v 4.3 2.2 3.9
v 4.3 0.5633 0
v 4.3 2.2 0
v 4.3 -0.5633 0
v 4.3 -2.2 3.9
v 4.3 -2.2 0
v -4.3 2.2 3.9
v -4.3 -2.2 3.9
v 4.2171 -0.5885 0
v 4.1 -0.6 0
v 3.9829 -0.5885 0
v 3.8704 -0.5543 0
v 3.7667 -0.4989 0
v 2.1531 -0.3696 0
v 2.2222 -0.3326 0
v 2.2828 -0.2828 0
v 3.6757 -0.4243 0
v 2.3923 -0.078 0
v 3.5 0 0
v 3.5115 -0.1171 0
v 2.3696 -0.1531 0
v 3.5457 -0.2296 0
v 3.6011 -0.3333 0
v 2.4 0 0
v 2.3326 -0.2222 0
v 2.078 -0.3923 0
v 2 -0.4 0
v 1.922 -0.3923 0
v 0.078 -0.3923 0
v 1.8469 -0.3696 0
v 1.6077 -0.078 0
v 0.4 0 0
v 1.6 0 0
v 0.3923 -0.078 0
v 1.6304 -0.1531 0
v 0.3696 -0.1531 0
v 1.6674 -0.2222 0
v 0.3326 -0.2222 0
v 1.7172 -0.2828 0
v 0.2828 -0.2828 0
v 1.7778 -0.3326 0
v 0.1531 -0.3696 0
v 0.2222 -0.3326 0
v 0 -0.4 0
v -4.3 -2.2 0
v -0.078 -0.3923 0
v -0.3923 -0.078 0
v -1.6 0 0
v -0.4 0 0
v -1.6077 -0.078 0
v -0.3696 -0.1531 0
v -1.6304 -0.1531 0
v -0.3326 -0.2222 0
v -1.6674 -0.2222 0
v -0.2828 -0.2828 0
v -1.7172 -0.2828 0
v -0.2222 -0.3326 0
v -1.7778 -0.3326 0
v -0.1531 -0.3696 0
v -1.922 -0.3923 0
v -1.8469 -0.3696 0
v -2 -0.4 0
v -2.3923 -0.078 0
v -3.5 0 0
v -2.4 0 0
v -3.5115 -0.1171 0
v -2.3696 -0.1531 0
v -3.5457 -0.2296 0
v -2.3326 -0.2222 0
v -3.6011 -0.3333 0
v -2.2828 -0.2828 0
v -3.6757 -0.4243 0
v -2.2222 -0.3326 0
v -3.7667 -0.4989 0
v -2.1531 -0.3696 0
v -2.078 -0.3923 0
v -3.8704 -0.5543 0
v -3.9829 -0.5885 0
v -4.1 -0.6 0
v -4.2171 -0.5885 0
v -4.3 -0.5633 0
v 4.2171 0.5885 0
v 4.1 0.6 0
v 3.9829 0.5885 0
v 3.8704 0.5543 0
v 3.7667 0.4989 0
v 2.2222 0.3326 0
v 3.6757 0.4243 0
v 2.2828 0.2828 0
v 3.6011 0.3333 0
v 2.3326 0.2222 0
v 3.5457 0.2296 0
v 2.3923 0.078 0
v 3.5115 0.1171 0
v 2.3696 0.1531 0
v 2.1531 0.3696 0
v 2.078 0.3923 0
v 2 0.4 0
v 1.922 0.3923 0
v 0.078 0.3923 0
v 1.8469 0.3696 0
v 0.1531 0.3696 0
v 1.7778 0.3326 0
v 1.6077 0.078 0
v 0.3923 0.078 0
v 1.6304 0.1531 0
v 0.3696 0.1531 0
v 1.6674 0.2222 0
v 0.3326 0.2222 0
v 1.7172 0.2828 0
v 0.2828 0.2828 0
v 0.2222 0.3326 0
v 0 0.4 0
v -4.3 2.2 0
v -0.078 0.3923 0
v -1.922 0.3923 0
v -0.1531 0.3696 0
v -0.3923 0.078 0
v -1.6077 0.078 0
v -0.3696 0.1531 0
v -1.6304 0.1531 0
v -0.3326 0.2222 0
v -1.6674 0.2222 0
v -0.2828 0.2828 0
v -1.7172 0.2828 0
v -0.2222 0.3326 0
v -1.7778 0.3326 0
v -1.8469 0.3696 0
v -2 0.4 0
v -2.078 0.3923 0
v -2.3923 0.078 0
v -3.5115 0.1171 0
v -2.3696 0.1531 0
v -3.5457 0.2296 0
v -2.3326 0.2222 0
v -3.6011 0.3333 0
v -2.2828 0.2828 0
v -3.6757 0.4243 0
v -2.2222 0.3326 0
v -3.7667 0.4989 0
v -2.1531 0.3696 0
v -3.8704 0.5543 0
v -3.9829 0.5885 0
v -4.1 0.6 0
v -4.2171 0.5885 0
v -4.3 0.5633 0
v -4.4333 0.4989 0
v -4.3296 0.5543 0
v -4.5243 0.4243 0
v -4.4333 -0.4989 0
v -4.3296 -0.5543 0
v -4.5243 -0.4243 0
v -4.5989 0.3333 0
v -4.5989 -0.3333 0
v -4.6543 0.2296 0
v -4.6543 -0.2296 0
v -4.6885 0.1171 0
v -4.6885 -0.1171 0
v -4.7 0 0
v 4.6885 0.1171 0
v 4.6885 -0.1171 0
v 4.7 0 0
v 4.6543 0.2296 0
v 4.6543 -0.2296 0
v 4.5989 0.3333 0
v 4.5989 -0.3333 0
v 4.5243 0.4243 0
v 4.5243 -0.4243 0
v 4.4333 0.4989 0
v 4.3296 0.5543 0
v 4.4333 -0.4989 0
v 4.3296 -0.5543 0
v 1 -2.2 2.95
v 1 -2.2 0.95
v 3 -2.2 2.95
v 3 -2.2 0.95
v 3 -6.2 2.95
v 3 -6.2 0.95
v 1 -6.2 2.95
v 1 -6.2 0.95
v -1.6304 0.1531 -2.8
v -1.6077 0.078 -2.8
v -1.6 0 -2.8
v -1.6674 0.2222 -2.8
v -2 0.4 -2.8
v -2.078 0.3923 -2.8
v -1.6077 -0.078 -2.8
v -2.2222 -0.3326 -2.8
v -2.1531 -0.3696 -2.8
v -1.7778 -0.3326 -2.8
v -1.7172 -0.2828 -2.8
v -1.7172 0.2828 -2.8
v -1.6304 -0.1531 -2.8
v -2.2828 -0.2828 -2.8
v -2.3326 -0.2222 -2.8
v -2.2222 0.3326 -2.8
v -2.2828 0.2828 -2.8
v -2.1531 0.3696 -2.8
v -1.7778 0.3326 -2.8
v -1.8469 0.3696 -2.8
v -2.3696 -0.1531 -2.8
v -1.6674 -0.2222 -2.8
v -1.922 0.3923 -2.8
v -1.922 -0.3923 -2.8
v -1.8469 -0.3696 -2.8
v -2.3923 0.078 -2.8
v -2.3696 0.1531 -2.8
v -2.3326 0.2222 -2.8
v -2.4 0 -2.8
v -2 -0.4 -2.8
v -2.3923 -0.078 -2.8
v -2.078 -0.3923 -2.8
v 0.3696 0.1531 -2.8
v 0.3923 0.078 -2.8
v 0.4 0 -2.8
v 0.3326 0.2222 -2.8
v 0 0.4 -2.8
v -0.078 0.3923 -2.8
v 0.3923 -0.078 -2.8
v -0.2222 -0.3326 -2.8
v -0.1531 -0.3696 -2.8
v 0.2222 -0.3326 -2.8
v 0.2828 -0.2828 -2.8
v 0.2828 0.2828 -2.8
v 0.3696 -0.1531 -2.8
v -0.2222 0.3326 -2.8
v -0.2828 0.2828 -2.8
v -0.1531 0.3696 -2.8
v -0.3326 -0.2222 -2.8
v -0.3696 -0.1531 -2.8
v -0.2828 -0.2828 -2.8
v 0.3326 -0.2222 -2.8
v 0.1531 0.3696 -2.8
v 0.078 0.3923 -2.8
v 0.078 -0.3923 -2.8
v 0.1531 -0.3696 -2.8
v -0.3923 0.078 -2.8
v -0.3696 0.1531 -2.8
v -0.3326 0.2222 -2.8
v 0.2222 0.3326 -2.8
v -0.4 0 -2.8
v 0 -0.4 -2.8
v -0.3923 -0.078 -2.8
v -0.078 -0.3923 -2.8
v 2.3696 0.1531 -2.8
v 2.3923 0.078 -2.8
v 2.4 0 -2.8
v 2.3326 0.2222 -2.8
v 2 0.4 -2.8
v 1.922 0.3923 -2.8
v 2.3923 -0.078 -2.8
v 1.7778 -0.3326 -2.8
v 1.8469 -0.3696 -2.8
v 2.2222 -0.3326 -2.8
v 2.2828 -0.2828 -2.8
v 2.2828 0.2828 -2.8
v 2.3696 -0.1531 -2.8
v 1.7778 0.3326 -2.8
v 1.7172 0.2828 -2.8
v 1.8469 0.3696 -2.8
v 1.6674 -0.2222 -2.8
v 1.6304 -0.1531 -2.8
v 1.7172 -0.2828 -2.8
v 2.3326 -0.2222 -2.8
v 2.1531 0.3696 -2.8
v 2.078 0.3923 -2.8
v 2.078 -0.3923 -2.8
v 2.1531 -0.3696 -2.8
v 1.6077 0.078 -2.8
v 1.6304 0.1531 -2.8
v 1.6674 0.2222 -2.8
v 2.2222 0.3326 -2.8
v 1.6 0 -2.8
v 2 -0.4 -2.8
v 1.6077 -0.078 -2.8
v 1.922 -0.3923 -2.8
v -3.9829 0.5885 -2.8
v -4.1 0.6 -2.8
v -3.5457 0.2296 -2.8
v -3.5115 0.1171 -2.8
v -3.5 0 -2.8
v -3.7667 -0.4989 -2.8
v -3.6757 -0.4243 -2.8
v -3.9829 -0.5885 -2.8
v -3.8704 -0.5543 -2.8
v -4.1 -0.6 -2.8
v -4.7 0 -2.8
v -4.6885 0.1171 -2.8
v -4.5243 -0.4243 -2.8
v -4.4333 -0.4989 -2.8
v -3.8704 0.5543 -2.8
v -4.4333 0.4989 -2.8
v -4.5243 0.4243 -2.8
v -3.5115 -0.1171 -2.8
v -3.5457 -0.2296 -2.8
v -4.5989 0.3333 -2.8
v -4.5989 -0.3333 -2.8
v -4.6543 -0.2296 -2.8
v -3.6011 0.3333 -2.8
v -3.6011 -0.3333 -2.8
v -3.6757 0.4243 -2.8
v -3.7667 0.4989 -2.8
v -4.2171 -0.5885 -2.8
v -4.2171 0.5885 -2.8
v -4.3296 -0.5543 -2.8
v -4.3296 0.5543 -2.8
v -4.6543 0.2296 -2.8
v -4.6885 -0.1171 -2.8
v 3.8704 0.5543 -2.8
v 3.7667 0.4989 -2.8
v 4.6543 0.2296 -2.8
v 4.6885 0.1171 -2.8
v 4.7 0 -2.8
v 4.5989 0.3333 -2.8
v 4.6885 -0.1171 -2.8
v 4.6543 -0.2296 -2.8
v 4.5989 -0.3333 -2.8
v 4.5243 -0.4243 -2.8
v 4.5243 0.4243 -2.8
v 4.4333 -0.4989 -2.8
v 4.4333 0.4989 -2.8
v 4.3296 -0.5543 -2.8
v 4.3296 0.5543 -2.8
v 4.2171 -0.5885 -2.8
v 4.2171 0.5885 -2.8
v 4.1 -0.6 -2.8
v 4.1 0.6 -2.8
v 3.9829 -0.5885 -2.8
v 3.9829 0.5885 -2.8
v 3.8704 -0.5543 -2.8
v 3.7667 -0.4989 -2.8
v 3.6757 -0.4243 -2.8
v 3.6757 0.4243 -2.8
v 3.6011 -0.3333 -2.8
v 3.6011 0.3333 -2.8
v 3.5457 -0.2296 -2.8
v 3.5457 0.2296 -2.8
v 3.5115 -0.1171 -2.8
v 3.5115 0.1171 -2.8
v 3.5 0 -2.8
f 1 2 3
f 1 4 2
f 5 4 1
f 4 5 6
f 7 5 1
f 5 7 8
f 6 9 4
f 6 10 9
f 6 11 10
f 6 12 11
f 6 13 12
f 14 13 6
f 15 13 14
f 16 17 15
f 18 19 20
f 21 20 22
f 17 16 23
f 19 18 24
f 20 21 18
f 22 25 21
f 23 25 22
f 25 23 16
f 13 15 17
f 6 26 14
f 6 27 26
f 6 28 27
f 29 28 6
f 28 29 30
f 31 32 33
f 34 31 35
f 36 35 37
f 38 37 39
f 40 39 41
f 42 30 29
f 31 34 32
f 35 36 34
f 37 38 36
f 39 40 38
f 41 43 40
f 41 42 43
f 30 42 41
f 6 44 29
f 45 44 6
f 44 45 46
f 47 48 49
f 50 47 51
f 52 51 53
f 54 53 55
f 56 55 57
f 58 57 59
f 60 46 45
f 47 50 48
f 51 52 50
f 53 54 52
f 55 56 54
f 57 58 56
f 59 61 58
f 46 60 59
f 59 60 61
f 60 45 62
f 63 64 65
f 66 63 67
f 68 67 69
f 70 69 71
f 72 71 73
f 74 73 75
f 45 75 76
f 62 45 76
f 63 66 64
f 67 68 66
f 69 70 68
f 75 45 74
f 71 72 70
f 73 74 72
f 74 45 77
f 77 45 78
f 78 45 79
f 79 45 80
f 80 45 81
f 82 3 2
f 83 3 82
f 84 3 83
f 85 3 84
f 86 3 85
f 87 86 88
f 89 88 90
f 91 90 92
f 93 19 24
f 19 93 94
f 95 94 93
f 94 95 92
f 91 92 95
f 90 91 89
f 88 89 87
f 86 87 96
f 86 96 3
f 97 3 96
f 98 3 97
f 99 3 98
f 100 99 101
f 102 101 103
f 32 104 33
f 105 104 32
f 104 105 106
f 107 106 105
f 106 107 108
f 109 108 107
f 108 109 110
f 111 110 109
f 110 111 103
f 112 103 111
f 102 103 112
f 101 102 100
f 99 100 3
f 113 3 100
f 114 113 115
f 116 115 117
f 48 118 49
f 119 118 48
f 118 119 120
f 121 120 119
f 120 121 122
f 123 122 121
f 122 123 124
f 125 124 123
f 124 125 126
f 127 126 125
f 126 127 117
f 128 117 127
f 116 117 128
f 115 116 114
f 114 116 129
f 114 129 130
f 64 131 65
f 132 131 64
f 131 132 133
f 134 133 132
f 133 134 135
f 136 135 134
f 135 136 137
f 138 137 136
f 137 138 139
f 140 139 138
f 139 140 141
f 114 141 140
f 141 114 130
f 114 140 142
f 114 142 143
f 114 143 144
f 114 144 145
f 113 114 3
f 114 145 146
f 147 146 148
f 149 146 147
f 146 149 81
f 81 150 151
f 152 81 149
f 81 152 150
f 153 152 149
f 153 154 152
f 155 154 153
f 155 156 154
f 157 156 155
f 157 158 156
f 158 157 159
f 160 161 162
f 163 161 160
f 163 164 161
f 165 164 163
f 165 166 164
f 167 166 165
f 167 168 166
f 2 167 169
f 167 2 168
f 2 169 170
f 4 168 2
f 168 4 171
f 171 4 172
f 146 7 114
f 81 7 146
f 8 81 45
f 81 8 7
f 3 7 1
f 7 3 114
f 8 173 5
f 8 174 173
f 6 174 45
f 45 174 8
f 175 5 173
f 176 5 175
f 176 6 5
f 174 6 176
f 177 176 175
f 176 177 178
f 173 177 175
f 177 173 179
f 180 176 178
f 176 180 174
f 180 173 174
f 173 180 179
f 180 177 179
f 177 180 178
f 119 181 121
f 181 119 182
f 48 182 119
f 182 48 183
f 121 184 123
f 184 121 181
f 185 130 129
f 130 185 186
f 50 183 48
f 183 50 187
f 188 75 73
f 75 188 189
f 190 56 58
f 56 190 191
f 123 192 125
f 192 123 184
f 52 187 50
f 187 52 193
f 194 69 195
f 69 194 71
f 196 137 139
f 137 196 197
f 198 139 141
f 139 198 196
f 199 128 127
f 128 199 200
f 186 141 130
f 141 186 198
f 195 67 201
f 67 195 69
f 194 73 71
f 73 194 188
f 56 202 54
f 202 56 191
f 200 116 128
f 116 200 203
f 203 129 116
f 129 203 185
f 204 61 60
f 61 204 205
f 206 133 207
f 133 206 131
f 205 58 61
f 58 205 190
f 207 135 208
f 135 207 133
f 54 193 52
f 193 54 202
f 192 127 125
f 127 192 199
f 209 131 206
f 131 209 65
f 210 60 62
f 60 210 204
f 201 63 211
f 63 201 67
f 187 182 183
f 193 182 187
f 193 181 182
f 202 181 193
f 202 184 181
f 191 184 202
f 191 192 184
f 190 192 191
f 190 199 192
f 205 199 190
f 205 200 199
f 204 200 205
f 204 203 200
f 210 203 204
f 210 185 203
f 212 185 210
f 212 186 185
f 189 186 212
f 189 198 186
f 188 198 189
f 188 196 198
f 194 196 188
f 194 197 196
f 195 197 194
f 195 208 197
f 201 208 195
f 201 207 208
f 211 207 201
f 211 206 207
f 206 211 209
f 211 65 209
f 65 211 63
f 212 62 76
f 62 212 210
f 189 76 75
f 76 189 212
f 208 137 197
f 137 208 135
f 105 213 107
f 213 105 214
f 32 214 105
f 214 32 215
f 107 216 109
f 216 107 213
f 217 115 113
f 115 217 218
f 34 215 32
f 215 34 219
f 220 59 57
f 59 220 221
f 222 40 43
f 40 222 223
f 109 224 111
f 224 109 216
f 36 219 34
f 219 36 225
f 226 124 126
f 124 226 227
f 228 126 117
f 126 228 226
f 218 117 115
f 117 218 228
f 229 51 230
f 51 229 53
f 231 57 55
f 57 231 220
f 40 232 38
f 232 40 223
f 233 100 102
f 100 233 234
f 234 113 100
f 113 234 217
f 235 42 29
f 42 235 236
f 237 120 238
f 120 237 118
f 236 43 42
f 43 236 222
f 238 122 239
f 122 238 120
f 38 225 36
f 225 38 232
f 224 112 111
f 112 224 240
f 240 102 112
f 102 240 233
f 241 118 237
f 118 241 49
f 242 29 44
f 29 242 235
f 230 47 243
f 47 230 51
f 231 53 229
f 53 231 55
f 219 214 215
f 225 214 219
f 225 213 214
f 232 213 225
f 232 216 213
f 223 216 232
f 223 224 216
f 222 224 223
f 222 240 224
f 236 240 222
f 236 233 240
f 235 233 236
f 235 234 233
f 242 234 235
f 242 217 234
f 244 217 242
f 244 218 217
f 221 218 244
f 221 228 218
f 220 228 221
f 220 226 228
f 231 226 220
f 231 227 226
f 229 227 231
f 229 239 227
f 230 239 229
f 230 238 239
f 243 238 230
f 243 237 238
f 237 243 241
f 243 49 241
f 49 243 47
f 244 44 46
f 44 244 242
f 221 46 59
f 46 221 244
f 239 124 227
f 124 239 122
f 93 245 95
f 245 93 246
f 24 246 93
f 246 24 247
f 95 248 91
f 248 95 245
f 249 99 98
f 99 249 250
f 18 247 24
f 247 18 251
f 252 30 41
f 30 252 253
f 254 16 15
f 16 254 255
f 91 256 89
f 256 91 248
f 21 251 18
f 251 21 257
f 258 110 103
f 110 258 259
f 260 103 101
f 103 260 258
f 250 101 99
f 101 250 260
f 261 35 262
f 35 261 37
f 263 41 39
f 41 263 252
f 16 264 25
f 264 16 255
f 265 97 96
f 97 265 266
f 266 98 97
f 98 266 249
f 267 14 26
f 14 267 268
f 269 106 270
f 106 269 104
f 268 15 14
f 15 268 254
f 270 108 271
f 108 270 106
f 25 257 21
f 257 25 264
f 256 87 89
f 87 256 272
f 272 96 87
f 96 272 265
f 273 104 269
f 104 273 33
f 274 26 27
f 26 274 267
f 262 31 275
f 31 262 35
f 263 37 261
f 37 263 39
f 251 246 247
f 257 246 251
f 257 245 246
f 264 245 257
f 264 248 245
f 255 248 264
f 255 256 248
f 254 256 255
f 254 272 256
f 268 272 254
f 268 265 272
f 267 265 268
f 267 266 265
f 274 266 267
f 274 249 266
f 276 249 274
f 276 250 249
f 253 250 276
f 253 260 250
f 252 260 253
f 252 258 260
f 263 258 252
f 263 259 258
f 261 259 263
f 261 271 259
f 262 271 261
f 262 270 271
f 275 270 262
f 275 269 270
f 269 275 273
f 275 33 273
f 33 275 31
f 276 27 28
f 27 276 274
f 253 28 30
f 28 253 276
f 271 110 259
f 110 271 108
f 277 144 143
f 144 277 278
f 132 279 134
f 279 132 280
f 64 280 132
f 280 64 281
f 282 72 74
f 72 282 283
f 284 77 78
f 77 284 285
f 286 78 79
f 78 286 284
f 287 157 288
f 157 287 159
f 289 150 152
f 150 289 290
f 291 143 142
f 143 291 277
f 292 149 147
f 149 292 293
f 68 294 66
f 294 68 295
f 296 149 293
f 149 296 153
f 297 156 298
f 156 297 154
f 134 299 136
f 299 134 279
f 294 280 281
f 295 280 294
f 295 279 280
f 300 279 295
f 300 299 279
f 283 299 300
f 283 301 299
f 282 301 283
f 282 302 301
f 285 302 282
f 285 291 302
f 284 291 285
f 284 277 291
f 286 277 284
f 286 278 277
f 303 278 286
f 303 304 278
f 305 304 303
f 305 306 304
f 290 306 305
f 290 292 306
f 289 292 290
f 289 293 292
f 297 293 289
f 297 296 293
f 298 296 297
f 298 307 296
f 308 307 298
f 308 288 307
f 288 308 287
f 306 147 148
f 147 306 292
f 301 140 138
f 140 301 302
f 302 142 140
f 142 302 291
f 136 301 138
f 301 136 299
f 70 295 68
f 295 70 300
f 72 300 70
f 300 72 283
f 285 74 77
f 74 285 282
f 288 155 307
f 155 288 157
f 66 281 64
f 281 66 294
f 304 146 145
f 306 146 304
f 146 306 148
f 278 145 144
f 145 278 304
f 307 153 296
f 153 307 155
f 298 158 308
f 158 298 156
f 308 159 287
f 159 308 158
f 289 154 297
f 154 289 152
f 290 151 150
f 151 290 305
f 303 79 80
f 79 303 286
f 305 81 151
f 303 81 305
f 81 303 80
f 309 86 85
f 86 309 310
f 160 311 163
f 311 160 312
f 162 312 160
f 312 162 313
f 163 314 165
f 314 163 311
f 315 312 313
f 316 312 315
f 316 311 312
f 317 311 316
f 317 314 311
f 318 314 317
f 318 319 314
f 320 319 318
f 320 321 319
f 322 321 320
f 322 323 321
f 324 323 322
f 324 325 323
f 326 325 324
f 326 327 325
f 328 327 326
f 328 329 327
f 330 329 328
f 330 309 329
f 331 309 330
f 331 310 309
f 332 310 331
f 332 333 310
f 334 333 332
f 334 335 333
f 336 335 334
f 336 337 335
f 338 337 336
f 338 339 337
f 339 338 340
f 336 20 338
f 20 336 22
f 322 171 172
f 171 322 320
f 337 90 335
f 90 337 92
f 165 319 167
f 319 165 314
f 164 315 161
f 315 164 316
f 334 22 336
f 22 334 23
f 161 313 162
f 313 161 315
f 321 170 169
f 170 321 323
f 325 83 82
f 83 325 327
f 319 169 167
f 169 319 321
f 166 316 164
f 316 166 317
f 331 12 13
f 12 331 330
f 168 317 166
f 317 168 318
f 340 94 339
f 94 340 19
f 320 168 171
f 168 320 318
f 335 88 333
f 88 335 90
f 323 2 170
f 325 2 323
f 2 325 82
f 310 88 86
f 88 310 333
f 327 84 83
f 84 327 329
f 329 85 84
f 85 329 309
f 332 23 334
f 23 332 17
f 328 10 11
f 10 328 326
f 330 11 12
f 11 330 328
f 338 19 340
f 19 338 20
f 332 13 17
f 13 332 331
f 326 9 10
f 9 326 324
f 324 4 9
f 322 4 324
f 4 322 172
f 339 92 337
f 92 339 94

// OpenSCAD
//
// OS102011MA1QN1 switch
//
$fn = 32;

bod_x = 8.6;
bod_y = 4.4;
bod_z = 3.9;

sw_x = 2.0;
sw_y = 4.0;
sw_z = 2.0;

pin_d = 0.8;
pin_g = 1.2;
pin_z = 2.8;

module pin_at_dia( px, py, pd) {
     translate( [px, py, -pin_z])
	  color("gold")
	  cylinder( d=pd, h=pin_z);
}

module body() {
     color("lightgrey")
     translate( [-bod_x/2, -bod_y/2, 0])
	  cube( [bod_x, bod_y, bod_z]);
}

module sw() {
     translate( [1, -bod_y/2-sw_y ,bod_z/2-sw_z/2])
	  color("black")
	  cube( [sw_x, sw_y, sw_z]);
}

module switch() {
     body();
     sw();
     pin_at_dia( -2, 0, pin_d);
     pin_at_dia( 0, 0, pin_d);
     pin_at_dia( 2, 0, pin_d);
     pin_at_dia( -4.1, 0, pin_g);
     pin_at_dia( 4.1, 0, pin_g);
}

switch();
